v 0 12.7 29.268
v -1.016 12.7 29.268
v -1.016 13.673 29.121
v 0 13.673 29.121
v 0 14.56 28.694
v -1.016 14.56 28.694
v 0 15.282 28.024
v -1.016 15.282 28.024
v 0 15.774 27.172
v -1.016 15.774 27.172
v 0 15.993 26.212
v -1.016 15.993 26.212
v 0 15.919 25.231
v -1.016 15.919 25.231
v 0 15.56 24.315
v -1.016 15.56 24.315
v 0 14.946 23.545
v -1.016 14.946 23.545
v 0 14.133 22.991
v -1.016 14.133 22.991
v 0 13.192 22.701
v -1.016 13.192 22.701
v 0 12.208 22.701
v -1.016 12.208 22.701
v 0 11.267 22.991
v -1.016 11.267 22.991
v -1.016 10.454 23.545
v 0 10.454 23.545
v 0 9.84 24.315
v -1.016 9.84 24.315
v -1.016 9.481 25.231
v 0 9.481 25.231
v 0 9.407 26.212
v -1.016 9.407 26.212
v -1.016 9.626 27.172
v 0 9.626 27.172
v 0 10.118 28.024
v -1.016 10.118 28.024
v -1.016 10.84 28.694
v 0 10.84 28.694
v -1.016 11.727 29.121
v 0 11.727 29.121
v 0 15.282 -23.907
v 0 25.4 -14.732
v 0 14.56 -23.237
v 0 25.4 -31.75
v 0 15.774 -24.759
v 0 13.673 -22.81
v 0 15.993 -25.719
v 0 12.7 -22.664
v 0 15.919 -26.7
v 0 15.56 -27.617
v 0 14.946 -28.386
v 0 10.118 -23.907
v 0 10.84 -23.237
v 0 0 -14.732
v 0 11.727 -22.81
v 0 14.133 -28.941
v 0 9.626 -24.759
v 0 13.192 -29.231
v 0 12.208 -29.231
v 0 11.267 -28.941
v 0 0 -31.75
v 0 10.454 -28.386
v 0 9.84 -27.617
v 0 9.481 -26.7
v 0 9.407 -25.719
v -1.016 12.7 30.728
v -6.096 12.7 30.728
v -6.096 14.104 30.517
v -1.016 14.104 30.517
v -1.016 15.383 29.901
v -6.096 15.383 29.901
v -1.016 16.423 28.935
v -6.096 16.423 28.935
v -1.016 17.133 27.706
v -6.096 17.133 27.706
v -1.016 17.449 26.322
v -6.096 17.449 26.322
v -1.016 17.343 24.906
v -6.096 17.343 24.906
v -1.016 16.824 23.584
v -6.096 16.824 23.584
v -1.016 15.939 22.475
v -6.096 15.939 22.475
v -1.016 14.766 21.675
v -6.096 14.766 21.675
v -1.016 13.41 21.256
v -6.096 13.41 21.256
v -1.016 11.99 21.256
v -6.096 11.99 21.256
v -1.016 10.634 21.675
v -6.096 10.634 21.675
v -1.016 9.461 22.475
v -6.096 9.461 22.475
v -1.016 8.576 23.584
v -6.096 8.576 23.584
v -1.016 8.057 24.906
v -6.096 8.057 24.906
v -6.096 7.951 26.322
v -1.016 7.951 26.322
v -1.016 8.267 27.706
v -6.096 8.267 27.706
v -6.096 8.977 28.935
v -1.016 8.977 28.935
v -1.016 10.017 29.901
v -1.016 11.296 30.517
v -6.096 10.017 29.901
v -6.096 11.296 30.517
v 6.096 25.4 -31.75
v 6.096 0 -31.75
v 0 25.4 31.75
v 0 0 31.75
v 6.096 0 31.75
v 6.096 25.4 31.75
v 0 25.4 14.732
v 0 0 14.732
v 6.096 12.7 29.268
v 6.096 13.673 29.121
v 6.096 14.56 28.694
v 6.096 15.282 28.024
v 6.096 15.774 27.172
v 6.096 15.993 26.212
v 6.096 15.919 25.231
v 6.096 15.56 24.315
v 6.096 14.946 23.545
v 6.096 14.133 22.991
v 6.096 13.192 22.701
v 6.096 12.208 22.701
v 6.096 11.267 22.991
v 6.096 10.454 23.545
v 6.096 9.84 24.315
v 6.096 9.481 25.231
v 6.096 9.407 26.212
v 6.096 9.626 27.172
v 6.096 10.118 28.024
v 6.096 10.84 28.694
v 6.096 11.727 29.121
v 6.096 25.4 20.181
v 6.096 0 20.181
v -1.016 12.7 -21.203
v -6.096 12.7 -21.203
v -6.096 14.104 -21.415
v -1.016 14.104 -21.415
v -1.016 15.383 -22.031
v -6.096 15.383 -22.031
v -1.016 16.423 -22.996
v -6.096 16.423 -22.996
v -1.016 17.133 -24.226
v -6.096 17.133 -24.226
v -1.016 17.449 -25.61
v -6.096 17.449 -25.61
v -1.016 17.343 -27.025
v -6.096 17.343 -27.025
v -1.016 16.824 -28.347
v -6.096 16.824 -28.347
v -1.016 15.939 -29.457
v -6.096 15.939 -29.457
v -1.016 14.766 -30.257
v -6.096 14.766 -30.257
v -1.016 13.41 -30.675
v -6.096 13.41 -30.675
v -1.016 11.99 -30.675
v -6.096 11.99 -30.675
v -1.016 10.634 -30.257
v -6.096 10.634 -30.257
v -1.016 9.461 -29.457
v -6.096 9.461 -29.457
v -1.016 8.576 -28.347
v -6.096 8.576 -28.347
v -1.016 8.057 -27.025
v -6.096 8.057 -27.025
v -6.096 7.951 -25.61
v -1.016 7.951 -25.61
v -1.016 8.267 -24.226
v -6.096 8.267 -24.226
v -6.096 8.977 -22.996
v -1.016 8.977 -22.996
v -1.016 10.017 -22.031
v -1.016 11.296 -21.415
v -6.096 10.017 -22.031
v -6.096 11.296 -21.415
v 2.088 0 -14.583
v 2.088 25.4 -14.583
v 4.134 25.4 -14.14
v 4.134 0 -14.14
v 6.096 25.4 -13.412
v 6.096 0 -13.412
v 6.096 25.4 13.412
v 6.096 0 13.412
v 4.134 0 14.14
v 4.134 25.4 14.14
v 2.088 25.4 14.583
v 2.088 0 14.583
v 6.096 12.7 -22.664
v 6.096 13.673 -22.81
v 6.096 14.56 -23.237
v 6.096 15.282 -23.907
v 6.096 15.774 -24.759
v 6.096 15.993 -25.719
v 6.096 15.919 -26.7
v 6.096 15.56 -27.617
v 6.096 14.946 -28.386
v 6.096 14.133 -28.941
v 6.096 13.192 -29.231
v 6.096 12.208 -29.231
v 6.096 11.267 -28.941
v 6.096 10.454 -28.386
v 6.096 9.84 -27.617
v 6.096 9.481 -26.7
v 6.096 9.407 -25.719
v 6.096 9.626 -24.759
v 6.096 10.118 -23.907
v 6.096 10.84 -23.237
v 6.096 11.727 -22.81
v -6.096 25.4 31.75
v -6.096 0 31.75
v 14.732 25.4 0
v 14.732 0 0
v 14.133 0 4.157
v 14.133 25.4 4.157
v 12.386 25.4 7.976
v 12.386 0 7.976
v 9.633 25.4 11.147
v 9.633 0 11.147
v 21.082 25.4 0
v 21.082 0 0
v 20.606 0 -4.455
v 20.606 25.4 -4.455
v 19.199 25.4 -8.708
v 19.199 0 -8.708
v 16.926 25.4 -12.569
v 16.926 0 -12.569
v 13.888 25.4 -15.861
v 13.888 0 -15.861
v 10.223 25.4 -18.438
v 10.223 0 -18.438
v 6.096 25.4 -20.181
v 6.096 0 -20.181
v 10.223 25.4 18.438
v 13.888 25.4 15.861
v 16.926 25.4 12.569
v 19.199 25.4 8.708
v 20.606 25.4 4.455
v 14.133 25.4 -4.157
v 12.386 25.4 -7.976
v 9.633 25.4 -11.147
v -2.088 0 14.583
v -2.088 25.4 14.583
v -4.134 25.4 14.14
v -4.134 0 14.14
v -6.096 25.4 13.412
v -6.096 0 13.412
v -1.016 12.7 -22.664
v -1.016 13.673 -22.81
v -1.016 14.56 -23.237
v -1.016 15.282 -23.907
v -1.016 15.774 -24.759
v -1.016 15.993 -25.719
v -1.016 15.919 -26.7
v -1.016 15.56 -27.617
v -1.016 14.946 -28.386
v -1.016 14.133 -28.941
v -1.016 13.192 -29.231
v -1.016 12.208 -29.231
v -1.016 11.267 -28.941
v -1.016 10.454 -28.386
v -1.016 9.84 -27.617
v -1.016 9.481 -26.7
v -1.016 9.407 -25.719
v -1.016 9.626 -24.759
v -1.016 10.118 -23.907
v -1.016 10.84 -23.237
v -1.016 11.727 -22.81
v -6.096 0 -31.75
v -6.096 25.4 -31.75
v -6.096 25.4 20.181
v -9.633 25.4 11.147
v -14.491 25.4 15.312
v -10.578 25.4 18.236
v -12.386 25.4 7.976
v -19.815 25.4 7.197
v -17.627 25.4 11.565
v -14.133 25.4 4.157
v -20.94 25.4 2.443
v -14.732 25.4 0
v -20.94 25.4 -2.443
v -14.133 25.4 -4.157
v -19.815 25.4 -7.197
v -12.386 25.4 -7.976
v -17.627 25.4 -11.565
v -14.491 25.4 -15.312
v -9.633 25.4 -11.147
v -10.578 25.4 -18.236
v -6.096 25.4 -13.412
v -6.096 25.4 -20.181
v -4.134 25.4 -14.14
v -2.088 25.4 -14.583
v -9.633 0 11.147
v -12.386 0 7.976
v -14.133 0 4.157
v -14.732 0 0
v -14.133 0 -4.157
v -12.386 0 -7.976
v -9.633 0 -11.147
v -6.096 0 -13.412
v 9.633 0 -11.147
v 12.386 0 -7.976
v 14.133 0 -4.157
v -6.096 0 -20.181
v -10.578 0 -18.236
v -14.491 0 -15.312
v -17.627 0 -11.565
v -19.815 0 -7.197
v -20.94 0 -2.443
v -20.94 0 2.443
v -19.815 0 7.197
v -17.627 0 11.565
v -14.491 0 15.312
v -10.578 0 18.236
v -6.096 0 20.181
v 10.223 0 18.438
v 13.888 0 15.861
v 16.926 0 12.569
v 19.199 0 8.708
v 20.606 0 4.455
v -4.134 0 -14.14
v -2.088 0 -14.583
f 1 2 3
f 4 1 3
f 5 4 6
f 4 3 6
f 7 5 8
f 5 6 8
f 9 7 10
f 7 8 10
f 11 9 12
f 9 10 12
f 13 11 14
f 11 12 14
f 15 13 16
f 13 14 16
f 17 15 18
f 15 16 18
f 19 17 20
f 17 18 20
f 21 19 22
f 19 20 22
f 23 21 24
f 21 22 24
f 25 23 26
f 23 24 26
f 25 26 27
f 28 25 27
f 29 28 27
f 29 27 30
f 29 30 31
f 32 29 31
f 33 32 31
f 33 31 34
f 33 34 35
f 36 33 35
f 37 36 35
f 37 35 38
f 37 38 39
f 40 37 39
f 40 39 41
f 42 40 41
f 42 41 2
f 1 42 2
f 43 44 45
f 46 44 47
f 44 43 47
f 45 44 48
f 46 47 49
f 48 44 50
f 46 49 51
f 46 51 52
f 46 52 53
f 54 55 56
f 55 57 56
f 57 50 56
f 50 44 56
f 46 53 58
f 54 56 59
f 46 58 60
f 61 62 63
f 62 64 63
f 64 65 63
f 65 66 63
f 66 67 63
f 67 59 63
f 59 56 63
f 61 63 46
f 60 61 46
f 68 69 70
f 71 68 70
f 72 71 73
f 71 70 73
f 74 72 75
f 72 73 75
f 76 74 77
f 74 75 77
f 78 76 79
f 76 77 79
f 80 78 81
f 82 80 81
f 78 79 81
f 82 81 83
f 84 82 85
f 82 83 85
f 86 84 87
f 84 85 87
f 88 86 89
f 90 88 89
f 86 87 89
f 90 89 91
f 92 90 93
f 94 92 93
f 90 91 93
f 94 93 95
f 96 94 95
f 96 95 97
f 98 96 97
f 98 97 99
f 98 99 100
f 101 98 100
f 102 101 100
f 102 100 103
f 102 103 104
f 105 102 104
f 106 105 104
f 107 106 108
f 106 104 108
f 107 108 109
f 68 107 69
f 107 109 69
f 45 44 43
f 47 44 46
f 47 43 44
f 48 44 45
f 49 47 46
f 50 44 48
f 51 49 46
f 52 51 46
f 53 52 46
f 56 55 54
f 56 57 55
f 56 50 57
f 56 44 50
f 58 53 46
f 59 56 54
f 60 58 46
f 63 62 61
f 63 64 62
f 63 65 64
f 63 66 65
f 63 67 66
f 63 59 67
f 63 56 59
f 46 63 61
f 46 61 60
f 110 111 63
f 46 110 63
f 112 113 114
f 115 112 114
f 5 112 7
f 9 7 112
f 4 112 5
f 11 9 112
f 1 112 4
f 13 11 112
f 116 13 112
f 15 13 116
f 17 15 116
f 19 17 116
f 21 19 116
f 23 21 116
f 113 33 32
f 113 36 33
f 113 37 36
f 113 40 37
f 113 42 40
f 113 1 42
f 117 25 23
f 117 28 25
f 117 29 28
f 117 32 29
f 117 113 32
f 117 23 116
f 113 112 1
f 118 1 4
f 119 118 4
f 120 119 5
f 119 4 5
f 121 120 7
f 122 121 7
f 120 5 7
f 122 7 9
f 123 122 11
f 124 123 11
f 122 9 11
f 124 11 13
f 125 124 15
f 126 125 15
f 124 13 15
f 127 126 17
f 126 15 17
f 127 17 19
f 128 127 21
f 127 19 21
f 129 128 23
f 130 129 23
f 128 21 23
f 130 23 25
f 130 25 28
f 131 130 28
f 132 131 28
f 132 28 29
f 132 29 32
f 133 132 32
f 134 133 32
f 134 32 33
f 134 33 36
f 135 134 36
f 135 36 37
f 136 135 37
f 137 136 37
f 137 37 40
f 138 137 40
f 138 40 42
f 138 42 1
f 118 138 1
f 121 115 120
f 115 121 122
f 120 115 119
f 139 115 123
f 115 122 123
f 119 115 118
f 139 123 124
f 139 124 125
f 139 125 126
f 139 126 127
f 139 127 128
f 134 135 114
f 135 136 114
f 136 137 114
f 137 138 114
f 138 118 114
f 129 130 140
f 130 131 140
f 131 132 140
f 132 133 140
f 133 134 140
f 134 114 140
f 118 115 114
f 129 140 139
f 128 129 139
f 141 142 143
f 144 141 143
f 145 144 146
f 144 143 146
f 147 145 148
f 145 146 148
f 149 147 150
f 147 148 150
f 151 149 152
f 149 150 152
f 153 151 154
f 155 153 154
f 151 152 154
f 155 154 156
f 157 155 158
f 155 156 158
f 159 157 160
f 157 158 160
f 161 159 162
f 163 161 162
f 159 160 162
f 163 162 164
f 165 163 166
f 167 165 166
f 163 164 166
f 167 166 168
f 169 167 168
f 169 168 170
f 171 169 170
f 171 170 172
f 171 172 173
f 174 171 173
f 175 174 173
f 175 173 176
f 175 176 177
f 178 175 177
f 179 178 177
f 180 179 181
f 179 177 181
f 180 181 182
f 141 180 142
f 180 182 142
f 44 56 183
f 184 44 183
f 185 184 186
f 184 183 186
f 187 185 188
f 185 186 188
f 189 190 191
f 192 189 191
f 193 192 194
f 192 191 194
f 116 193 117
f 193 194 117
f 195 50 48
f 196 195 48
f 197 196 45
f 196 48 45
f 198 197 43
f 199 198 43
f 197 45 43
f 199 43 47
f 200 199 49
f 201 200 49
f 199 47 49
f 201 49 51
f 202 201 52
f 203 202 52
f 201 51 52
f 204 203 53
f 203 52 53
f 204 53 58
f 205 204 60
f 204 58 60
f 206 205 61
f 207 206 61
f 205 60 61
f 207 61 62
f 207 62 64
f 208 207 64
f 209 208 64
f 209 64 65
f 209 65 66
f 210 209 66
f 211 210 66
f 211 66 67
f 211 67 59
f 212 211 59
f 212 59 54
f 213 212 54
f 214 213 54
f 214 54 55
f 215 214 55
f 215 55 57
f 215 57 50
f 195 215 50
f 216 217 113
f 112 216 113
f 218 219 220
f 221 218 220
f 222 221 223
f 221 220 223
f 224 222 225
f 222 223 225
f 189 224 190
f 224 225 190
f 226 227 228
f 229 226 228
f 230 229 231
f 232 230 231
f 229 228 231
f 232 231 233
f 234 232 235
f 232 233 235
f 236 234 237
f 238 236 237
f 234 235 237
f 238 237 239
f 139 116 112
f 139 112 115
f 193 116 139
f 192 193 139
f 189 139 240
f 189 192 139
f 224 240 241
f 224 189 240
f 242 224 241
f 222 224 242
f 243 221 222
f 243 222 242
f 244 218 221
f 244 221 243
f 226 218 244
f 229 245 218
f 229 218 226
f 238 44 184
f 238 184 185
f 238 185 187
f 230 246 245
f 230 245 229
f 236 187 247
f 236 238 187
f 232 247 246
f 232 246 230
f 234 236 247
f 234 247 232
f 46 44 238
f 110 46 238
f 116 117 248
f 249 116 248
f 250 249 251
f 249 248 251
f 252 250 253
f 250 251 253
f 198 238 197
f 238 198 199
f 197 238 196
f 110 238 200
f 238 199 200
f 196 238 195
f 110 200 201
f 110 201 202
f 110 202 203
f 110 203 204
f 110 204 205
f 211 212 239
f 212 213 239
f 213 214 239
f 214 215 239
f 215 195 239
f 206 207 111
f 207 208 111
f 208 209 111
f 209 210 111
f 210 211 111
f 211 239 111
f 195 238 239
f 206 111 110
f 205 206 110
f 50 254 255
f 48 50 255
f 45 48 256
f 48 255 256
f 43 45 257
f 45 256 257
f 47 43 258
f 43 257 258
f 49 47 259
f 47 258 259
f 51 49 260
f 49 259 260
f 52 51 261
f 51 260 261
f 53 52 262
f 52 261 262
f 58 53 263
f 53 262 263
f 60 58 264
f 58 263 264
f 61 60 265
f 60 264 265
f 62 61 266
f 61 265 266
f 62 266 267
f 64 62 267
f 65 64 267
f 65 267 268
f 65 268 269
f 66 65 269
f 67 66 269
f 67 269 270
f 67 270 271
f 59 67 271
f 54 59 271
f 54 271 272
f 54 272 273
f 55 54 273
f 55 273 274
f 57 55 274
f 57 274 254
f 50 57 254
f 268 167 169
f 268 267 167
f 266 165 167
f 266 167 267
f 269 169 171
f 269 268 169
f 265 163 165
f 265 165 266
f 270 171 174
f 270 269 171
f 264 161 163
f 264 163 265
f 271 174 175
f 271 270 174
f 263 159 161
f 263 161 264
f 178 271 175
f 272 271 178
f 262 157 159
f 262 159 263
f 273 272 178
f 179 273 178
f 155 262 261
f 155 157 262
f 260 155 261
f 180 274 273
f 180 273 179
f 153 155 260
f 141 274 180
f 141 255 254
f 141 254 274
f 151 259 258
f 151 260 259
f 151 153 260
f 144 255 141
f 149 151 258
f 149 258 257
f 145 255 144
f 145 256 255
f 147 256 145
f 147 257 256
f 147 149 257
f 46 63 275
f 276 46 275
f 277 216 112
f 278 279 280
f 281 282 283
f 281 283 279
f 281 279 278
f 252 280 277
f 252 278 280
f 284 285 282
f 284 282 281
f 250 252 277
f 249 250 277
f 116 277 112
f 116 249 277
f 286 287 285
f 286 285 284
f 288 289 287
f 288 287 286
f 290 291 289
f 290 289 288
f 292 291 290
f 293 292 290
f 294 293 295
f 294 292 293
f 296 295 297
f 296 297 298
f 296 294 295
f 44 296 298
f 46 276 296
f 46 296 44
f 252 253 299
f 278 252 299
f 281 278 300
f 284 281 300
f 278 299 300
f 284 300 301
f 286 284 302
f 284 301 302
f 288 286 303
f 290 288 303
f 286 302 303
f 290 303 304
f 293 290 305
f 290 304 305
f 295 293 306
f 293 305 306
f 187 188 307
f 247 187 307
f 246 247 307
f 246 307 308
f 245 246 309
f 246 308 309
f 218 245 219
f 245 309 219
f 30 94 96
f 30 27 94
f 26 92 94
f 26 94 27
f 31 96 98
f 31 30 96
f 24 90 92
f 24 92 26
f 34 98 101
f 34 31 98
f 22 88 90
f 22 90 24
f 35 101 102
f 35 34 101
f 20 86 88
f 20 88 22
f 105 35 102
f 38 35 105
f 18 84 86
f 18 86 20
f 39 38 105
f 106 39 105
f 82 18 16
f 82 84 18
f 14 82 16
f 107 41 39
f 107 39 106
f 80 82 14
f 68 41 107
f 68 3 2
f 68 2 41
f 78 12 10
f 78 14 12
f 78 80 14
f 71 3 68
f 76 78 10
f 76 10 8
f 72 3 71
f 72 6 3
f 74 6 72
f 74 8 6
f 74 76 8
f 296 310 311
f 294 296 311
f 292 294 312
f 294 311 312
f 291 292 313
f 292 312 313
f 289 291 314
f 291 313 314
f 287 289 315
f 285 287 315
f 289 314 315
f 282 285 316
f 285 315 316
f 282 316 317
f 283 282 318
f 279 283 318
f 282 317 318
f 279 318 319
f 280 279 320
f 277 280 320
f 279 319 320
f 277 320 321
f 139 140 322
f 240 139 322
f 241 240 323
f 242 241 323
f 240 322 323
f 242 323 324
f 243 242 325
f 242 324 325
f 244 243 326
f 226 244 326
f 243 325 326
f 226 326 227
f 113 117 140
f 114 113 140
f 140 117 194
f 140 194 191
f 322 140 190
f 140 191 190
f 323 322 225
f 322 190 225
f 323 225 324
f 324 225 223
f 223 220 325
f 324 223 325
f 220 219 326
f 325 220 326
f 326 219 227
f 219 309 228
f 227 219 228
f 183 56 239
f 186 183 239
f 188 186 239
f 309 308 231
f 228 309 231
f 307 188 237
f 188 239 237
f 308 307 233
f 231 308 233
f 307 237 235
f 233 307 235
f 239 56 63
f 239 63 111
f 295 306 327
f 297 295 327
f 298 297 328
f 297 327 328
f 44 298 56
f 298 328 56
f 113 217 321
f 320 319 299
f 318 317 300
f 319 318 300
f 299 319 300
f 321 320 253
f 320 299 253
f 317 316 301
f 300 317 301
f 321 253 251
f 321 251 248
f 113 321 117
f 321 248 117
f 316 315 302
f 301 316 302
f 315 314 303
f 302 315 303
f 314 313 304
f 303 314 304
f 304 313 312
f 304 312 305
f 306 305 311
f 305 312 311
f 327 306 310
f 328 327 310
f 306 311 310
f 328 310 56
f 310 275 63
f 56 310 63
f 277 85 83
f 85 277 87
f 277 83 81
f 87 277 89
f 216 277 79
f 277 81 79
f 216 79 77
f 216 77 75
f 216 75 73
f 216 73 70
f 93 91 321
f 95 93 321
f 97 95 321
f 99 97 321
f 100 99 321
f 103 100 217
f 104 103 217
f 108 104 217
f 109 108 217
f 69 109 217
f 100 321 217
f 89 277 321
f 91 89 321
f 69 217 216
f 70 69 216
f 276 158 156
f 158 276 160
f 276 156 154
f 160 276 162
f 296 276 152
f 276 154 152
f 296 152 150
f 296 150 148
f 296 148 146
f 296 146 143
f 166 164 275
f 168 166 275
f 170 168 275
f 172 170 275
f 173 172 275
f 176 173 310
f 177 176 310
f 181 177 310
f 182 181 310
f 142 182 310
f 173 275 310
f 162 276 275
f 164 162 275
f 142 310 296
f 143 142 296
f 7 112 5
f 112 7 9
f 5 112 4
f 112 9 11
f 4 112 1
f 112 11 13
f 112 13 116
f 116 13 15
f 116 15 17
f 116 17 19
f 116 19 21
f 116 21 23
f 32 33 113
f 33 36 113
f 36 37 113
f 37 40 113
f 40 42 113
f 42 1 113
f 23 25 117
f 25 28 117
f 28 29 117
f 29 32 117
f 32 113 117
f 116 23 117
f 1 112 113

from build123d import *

# Parameters (mm, degrees)
BOSS_EXTRUDE2_DEPTH = 25.4
CUT_EXTRUDE1_REACH  = 29.178
SKETCH2_R           = 3.302
SKETCH3_R           = 4.7625
CUT_EXTRUDE2_DEPTH  = 5.08


with BuildPart() as part:
    # Sketch1 → Boss-Extrude2 (new body)
    with BuildSketch(Plane(origin=(0, 0, 0), x_dir=(1, 0, 0), z_dir=(0, 1, 0))):
        with BuildLine():
            Line((-6.096, 13.411584843), (-6.096, 20.181414916))
            ThreePointArc((-6.096, 20.181414916), (-21.082, 0), (-6.096, -20.181414916))
            Line((-6.096, -20.181414916), (-6.096, -13.411584843))
            ThreePointArc((-6.096, -13.411584843), (-14.732, 0), (-6.096, 13.411584843))
        make_face()
        with BuildLine():
            ThreePointArc((6.096, -20.181414916), (0, -21.082), (-6.096, -20.181414916))
            Line((-6.096, -20.181414916), (-6.096, -31.75))
            Line((-6.096, -31.75), (6.096, -31.75))
            Line((6.096, -31.75), (6.096, -20.181414916))
        make_face()
        with BuildLine():
            ThreePointArc((21.082, 0), (16.925817499, 12.568509299), (6.096, 20.181414916))
            Line((6.096, 20.181414916), (6.096, 13.411584843))
            ThreePointArc((6.096, 13.411584843), (12.386244306, 7.975761782), (14.732, 0))
            ThreePointArc((14.732, 0), (12.386244306, -7.975761782), (6.096, -13.411584843))
            Line((6.096, -13.411584843), (6.096, -20.181414916))
            ThreePointArc((6.096, -20.181414916), (16.925817499, -12.568509299), (21.082, 0))
        make_face()
        with BuildLine():
            ThreePointArc((6.096, 20.181414916), (0, 21.082), (-6.096, 20.181414916))
            Line((-6.096, 20.181414916), (-6.096, 13.411584843))
            ThreePointArc((-6.096, 13.411584843), (0, 14.732), (6.096, 13.411584843))
            Line((6.096, 13.411584843), (6.096, 20.181414916))
        make_face()
        with BuildLine():
            Line((-6.096, -13.411584843), (-6.096, -20.181414916))
            ThreePointArc((-6.096, -20.181414916), (0, -21.082), (6.096, -20.181414916))
            Line((6.096, -20.181414916), (6.096, -13.411584843))
            ThreePointArc((6.096, -13.411584843), (0, -14.732), (-6.096, -13.411584843))
        make_face()
        with BuildLine():
            Line((6.096, 31.75), (-6.096, 31.75))
            Line((-6.096, 31.75), (-6.096, 20.181414916))
            ThreePointArc((-6.096, 20.181414916), (0, 21.082), (6.096, 20.181414916))
            Line((6.096, 20.181414916), (6.096, 31.75))
        make_face()
    extrude(amount=BOSS_EXTRUDE2_DEPTH)

    # Sketch2 → Cut-Extrude1 (cut, up to next)
    with BuildSketch(Plane.ZY.offset(6.096), mode=Mode.PRIVATE) as cut_extrude1_sk1:
        with Locations((-25.965707458, 12.7)):
            Circle(SKETCH2_R)
    cut_extrude1_tool1 = extrude(cut_extrude1_sk1.sketch, amount=-CUT_EXTRUDE1_REACH, mode=Mode.PRIVATE) & part.part
    add(cut_extrude1_tool1.solids().sort_by_distance((-6.096, 12.7, -25.965707))[0], mode=Mode.SUBTRACT)
    # Sketch2 → Cut-Extrude1 (cut, up to next)
    with BuildSketch(Plane.ZY.offset(6.096), mode=Mode.PRIVATE) as cut_extrude1_sk2:
        with Locations((25.965707458, 12.7)):
            Circle(SKETCH2_R)
    cut_extrude1_tool2 = extrude(cut_extrude1_sk2.sketch, amount=-CUT_EXTRUDE1_REACH, mode=Mode.PRIVATE) & part.part
    add(cut_extrude1_tool2.solids().sort_by_distance((-6.096, 12.7, 25.965707))[0], mode=Mode.SUBTRACT)

    # Sketch3 → Cut-Extrude2 (cut)
    with BuildSketch(Plane.ZY.offset(6.096)):
        with Locations((-25.965707458, 12.7)):
            Circle(SKETCH3_R)
        with Locations((25.965707458, 12.7)):
            Circle(SKETCH3_R)
    extrude(amount=-CUT_EXTRUDE2_DEPTH, mode=Mode.SUBTRACT)


with BuildPart() as body_2:
    # Split1: the piece on the far side of the plane
    add(part.part)
    split(bisect_by=Plane(origin=(0, 0, 0), x_dir=(0, 0, -1), z_dir=(-1, 0, 0)), keep=Keep.BOTTOM)


with BuildPart() as part_1:
    add(part.part)

    # Split1
    split(bisect_by=Plane(origin=(0, 0, 0), x_dir=(0, 0, -1), z_dir=(-1, 0, 0)), keep=Keep.TOP)


solid = Compound([body_2.part, part_1.part])
